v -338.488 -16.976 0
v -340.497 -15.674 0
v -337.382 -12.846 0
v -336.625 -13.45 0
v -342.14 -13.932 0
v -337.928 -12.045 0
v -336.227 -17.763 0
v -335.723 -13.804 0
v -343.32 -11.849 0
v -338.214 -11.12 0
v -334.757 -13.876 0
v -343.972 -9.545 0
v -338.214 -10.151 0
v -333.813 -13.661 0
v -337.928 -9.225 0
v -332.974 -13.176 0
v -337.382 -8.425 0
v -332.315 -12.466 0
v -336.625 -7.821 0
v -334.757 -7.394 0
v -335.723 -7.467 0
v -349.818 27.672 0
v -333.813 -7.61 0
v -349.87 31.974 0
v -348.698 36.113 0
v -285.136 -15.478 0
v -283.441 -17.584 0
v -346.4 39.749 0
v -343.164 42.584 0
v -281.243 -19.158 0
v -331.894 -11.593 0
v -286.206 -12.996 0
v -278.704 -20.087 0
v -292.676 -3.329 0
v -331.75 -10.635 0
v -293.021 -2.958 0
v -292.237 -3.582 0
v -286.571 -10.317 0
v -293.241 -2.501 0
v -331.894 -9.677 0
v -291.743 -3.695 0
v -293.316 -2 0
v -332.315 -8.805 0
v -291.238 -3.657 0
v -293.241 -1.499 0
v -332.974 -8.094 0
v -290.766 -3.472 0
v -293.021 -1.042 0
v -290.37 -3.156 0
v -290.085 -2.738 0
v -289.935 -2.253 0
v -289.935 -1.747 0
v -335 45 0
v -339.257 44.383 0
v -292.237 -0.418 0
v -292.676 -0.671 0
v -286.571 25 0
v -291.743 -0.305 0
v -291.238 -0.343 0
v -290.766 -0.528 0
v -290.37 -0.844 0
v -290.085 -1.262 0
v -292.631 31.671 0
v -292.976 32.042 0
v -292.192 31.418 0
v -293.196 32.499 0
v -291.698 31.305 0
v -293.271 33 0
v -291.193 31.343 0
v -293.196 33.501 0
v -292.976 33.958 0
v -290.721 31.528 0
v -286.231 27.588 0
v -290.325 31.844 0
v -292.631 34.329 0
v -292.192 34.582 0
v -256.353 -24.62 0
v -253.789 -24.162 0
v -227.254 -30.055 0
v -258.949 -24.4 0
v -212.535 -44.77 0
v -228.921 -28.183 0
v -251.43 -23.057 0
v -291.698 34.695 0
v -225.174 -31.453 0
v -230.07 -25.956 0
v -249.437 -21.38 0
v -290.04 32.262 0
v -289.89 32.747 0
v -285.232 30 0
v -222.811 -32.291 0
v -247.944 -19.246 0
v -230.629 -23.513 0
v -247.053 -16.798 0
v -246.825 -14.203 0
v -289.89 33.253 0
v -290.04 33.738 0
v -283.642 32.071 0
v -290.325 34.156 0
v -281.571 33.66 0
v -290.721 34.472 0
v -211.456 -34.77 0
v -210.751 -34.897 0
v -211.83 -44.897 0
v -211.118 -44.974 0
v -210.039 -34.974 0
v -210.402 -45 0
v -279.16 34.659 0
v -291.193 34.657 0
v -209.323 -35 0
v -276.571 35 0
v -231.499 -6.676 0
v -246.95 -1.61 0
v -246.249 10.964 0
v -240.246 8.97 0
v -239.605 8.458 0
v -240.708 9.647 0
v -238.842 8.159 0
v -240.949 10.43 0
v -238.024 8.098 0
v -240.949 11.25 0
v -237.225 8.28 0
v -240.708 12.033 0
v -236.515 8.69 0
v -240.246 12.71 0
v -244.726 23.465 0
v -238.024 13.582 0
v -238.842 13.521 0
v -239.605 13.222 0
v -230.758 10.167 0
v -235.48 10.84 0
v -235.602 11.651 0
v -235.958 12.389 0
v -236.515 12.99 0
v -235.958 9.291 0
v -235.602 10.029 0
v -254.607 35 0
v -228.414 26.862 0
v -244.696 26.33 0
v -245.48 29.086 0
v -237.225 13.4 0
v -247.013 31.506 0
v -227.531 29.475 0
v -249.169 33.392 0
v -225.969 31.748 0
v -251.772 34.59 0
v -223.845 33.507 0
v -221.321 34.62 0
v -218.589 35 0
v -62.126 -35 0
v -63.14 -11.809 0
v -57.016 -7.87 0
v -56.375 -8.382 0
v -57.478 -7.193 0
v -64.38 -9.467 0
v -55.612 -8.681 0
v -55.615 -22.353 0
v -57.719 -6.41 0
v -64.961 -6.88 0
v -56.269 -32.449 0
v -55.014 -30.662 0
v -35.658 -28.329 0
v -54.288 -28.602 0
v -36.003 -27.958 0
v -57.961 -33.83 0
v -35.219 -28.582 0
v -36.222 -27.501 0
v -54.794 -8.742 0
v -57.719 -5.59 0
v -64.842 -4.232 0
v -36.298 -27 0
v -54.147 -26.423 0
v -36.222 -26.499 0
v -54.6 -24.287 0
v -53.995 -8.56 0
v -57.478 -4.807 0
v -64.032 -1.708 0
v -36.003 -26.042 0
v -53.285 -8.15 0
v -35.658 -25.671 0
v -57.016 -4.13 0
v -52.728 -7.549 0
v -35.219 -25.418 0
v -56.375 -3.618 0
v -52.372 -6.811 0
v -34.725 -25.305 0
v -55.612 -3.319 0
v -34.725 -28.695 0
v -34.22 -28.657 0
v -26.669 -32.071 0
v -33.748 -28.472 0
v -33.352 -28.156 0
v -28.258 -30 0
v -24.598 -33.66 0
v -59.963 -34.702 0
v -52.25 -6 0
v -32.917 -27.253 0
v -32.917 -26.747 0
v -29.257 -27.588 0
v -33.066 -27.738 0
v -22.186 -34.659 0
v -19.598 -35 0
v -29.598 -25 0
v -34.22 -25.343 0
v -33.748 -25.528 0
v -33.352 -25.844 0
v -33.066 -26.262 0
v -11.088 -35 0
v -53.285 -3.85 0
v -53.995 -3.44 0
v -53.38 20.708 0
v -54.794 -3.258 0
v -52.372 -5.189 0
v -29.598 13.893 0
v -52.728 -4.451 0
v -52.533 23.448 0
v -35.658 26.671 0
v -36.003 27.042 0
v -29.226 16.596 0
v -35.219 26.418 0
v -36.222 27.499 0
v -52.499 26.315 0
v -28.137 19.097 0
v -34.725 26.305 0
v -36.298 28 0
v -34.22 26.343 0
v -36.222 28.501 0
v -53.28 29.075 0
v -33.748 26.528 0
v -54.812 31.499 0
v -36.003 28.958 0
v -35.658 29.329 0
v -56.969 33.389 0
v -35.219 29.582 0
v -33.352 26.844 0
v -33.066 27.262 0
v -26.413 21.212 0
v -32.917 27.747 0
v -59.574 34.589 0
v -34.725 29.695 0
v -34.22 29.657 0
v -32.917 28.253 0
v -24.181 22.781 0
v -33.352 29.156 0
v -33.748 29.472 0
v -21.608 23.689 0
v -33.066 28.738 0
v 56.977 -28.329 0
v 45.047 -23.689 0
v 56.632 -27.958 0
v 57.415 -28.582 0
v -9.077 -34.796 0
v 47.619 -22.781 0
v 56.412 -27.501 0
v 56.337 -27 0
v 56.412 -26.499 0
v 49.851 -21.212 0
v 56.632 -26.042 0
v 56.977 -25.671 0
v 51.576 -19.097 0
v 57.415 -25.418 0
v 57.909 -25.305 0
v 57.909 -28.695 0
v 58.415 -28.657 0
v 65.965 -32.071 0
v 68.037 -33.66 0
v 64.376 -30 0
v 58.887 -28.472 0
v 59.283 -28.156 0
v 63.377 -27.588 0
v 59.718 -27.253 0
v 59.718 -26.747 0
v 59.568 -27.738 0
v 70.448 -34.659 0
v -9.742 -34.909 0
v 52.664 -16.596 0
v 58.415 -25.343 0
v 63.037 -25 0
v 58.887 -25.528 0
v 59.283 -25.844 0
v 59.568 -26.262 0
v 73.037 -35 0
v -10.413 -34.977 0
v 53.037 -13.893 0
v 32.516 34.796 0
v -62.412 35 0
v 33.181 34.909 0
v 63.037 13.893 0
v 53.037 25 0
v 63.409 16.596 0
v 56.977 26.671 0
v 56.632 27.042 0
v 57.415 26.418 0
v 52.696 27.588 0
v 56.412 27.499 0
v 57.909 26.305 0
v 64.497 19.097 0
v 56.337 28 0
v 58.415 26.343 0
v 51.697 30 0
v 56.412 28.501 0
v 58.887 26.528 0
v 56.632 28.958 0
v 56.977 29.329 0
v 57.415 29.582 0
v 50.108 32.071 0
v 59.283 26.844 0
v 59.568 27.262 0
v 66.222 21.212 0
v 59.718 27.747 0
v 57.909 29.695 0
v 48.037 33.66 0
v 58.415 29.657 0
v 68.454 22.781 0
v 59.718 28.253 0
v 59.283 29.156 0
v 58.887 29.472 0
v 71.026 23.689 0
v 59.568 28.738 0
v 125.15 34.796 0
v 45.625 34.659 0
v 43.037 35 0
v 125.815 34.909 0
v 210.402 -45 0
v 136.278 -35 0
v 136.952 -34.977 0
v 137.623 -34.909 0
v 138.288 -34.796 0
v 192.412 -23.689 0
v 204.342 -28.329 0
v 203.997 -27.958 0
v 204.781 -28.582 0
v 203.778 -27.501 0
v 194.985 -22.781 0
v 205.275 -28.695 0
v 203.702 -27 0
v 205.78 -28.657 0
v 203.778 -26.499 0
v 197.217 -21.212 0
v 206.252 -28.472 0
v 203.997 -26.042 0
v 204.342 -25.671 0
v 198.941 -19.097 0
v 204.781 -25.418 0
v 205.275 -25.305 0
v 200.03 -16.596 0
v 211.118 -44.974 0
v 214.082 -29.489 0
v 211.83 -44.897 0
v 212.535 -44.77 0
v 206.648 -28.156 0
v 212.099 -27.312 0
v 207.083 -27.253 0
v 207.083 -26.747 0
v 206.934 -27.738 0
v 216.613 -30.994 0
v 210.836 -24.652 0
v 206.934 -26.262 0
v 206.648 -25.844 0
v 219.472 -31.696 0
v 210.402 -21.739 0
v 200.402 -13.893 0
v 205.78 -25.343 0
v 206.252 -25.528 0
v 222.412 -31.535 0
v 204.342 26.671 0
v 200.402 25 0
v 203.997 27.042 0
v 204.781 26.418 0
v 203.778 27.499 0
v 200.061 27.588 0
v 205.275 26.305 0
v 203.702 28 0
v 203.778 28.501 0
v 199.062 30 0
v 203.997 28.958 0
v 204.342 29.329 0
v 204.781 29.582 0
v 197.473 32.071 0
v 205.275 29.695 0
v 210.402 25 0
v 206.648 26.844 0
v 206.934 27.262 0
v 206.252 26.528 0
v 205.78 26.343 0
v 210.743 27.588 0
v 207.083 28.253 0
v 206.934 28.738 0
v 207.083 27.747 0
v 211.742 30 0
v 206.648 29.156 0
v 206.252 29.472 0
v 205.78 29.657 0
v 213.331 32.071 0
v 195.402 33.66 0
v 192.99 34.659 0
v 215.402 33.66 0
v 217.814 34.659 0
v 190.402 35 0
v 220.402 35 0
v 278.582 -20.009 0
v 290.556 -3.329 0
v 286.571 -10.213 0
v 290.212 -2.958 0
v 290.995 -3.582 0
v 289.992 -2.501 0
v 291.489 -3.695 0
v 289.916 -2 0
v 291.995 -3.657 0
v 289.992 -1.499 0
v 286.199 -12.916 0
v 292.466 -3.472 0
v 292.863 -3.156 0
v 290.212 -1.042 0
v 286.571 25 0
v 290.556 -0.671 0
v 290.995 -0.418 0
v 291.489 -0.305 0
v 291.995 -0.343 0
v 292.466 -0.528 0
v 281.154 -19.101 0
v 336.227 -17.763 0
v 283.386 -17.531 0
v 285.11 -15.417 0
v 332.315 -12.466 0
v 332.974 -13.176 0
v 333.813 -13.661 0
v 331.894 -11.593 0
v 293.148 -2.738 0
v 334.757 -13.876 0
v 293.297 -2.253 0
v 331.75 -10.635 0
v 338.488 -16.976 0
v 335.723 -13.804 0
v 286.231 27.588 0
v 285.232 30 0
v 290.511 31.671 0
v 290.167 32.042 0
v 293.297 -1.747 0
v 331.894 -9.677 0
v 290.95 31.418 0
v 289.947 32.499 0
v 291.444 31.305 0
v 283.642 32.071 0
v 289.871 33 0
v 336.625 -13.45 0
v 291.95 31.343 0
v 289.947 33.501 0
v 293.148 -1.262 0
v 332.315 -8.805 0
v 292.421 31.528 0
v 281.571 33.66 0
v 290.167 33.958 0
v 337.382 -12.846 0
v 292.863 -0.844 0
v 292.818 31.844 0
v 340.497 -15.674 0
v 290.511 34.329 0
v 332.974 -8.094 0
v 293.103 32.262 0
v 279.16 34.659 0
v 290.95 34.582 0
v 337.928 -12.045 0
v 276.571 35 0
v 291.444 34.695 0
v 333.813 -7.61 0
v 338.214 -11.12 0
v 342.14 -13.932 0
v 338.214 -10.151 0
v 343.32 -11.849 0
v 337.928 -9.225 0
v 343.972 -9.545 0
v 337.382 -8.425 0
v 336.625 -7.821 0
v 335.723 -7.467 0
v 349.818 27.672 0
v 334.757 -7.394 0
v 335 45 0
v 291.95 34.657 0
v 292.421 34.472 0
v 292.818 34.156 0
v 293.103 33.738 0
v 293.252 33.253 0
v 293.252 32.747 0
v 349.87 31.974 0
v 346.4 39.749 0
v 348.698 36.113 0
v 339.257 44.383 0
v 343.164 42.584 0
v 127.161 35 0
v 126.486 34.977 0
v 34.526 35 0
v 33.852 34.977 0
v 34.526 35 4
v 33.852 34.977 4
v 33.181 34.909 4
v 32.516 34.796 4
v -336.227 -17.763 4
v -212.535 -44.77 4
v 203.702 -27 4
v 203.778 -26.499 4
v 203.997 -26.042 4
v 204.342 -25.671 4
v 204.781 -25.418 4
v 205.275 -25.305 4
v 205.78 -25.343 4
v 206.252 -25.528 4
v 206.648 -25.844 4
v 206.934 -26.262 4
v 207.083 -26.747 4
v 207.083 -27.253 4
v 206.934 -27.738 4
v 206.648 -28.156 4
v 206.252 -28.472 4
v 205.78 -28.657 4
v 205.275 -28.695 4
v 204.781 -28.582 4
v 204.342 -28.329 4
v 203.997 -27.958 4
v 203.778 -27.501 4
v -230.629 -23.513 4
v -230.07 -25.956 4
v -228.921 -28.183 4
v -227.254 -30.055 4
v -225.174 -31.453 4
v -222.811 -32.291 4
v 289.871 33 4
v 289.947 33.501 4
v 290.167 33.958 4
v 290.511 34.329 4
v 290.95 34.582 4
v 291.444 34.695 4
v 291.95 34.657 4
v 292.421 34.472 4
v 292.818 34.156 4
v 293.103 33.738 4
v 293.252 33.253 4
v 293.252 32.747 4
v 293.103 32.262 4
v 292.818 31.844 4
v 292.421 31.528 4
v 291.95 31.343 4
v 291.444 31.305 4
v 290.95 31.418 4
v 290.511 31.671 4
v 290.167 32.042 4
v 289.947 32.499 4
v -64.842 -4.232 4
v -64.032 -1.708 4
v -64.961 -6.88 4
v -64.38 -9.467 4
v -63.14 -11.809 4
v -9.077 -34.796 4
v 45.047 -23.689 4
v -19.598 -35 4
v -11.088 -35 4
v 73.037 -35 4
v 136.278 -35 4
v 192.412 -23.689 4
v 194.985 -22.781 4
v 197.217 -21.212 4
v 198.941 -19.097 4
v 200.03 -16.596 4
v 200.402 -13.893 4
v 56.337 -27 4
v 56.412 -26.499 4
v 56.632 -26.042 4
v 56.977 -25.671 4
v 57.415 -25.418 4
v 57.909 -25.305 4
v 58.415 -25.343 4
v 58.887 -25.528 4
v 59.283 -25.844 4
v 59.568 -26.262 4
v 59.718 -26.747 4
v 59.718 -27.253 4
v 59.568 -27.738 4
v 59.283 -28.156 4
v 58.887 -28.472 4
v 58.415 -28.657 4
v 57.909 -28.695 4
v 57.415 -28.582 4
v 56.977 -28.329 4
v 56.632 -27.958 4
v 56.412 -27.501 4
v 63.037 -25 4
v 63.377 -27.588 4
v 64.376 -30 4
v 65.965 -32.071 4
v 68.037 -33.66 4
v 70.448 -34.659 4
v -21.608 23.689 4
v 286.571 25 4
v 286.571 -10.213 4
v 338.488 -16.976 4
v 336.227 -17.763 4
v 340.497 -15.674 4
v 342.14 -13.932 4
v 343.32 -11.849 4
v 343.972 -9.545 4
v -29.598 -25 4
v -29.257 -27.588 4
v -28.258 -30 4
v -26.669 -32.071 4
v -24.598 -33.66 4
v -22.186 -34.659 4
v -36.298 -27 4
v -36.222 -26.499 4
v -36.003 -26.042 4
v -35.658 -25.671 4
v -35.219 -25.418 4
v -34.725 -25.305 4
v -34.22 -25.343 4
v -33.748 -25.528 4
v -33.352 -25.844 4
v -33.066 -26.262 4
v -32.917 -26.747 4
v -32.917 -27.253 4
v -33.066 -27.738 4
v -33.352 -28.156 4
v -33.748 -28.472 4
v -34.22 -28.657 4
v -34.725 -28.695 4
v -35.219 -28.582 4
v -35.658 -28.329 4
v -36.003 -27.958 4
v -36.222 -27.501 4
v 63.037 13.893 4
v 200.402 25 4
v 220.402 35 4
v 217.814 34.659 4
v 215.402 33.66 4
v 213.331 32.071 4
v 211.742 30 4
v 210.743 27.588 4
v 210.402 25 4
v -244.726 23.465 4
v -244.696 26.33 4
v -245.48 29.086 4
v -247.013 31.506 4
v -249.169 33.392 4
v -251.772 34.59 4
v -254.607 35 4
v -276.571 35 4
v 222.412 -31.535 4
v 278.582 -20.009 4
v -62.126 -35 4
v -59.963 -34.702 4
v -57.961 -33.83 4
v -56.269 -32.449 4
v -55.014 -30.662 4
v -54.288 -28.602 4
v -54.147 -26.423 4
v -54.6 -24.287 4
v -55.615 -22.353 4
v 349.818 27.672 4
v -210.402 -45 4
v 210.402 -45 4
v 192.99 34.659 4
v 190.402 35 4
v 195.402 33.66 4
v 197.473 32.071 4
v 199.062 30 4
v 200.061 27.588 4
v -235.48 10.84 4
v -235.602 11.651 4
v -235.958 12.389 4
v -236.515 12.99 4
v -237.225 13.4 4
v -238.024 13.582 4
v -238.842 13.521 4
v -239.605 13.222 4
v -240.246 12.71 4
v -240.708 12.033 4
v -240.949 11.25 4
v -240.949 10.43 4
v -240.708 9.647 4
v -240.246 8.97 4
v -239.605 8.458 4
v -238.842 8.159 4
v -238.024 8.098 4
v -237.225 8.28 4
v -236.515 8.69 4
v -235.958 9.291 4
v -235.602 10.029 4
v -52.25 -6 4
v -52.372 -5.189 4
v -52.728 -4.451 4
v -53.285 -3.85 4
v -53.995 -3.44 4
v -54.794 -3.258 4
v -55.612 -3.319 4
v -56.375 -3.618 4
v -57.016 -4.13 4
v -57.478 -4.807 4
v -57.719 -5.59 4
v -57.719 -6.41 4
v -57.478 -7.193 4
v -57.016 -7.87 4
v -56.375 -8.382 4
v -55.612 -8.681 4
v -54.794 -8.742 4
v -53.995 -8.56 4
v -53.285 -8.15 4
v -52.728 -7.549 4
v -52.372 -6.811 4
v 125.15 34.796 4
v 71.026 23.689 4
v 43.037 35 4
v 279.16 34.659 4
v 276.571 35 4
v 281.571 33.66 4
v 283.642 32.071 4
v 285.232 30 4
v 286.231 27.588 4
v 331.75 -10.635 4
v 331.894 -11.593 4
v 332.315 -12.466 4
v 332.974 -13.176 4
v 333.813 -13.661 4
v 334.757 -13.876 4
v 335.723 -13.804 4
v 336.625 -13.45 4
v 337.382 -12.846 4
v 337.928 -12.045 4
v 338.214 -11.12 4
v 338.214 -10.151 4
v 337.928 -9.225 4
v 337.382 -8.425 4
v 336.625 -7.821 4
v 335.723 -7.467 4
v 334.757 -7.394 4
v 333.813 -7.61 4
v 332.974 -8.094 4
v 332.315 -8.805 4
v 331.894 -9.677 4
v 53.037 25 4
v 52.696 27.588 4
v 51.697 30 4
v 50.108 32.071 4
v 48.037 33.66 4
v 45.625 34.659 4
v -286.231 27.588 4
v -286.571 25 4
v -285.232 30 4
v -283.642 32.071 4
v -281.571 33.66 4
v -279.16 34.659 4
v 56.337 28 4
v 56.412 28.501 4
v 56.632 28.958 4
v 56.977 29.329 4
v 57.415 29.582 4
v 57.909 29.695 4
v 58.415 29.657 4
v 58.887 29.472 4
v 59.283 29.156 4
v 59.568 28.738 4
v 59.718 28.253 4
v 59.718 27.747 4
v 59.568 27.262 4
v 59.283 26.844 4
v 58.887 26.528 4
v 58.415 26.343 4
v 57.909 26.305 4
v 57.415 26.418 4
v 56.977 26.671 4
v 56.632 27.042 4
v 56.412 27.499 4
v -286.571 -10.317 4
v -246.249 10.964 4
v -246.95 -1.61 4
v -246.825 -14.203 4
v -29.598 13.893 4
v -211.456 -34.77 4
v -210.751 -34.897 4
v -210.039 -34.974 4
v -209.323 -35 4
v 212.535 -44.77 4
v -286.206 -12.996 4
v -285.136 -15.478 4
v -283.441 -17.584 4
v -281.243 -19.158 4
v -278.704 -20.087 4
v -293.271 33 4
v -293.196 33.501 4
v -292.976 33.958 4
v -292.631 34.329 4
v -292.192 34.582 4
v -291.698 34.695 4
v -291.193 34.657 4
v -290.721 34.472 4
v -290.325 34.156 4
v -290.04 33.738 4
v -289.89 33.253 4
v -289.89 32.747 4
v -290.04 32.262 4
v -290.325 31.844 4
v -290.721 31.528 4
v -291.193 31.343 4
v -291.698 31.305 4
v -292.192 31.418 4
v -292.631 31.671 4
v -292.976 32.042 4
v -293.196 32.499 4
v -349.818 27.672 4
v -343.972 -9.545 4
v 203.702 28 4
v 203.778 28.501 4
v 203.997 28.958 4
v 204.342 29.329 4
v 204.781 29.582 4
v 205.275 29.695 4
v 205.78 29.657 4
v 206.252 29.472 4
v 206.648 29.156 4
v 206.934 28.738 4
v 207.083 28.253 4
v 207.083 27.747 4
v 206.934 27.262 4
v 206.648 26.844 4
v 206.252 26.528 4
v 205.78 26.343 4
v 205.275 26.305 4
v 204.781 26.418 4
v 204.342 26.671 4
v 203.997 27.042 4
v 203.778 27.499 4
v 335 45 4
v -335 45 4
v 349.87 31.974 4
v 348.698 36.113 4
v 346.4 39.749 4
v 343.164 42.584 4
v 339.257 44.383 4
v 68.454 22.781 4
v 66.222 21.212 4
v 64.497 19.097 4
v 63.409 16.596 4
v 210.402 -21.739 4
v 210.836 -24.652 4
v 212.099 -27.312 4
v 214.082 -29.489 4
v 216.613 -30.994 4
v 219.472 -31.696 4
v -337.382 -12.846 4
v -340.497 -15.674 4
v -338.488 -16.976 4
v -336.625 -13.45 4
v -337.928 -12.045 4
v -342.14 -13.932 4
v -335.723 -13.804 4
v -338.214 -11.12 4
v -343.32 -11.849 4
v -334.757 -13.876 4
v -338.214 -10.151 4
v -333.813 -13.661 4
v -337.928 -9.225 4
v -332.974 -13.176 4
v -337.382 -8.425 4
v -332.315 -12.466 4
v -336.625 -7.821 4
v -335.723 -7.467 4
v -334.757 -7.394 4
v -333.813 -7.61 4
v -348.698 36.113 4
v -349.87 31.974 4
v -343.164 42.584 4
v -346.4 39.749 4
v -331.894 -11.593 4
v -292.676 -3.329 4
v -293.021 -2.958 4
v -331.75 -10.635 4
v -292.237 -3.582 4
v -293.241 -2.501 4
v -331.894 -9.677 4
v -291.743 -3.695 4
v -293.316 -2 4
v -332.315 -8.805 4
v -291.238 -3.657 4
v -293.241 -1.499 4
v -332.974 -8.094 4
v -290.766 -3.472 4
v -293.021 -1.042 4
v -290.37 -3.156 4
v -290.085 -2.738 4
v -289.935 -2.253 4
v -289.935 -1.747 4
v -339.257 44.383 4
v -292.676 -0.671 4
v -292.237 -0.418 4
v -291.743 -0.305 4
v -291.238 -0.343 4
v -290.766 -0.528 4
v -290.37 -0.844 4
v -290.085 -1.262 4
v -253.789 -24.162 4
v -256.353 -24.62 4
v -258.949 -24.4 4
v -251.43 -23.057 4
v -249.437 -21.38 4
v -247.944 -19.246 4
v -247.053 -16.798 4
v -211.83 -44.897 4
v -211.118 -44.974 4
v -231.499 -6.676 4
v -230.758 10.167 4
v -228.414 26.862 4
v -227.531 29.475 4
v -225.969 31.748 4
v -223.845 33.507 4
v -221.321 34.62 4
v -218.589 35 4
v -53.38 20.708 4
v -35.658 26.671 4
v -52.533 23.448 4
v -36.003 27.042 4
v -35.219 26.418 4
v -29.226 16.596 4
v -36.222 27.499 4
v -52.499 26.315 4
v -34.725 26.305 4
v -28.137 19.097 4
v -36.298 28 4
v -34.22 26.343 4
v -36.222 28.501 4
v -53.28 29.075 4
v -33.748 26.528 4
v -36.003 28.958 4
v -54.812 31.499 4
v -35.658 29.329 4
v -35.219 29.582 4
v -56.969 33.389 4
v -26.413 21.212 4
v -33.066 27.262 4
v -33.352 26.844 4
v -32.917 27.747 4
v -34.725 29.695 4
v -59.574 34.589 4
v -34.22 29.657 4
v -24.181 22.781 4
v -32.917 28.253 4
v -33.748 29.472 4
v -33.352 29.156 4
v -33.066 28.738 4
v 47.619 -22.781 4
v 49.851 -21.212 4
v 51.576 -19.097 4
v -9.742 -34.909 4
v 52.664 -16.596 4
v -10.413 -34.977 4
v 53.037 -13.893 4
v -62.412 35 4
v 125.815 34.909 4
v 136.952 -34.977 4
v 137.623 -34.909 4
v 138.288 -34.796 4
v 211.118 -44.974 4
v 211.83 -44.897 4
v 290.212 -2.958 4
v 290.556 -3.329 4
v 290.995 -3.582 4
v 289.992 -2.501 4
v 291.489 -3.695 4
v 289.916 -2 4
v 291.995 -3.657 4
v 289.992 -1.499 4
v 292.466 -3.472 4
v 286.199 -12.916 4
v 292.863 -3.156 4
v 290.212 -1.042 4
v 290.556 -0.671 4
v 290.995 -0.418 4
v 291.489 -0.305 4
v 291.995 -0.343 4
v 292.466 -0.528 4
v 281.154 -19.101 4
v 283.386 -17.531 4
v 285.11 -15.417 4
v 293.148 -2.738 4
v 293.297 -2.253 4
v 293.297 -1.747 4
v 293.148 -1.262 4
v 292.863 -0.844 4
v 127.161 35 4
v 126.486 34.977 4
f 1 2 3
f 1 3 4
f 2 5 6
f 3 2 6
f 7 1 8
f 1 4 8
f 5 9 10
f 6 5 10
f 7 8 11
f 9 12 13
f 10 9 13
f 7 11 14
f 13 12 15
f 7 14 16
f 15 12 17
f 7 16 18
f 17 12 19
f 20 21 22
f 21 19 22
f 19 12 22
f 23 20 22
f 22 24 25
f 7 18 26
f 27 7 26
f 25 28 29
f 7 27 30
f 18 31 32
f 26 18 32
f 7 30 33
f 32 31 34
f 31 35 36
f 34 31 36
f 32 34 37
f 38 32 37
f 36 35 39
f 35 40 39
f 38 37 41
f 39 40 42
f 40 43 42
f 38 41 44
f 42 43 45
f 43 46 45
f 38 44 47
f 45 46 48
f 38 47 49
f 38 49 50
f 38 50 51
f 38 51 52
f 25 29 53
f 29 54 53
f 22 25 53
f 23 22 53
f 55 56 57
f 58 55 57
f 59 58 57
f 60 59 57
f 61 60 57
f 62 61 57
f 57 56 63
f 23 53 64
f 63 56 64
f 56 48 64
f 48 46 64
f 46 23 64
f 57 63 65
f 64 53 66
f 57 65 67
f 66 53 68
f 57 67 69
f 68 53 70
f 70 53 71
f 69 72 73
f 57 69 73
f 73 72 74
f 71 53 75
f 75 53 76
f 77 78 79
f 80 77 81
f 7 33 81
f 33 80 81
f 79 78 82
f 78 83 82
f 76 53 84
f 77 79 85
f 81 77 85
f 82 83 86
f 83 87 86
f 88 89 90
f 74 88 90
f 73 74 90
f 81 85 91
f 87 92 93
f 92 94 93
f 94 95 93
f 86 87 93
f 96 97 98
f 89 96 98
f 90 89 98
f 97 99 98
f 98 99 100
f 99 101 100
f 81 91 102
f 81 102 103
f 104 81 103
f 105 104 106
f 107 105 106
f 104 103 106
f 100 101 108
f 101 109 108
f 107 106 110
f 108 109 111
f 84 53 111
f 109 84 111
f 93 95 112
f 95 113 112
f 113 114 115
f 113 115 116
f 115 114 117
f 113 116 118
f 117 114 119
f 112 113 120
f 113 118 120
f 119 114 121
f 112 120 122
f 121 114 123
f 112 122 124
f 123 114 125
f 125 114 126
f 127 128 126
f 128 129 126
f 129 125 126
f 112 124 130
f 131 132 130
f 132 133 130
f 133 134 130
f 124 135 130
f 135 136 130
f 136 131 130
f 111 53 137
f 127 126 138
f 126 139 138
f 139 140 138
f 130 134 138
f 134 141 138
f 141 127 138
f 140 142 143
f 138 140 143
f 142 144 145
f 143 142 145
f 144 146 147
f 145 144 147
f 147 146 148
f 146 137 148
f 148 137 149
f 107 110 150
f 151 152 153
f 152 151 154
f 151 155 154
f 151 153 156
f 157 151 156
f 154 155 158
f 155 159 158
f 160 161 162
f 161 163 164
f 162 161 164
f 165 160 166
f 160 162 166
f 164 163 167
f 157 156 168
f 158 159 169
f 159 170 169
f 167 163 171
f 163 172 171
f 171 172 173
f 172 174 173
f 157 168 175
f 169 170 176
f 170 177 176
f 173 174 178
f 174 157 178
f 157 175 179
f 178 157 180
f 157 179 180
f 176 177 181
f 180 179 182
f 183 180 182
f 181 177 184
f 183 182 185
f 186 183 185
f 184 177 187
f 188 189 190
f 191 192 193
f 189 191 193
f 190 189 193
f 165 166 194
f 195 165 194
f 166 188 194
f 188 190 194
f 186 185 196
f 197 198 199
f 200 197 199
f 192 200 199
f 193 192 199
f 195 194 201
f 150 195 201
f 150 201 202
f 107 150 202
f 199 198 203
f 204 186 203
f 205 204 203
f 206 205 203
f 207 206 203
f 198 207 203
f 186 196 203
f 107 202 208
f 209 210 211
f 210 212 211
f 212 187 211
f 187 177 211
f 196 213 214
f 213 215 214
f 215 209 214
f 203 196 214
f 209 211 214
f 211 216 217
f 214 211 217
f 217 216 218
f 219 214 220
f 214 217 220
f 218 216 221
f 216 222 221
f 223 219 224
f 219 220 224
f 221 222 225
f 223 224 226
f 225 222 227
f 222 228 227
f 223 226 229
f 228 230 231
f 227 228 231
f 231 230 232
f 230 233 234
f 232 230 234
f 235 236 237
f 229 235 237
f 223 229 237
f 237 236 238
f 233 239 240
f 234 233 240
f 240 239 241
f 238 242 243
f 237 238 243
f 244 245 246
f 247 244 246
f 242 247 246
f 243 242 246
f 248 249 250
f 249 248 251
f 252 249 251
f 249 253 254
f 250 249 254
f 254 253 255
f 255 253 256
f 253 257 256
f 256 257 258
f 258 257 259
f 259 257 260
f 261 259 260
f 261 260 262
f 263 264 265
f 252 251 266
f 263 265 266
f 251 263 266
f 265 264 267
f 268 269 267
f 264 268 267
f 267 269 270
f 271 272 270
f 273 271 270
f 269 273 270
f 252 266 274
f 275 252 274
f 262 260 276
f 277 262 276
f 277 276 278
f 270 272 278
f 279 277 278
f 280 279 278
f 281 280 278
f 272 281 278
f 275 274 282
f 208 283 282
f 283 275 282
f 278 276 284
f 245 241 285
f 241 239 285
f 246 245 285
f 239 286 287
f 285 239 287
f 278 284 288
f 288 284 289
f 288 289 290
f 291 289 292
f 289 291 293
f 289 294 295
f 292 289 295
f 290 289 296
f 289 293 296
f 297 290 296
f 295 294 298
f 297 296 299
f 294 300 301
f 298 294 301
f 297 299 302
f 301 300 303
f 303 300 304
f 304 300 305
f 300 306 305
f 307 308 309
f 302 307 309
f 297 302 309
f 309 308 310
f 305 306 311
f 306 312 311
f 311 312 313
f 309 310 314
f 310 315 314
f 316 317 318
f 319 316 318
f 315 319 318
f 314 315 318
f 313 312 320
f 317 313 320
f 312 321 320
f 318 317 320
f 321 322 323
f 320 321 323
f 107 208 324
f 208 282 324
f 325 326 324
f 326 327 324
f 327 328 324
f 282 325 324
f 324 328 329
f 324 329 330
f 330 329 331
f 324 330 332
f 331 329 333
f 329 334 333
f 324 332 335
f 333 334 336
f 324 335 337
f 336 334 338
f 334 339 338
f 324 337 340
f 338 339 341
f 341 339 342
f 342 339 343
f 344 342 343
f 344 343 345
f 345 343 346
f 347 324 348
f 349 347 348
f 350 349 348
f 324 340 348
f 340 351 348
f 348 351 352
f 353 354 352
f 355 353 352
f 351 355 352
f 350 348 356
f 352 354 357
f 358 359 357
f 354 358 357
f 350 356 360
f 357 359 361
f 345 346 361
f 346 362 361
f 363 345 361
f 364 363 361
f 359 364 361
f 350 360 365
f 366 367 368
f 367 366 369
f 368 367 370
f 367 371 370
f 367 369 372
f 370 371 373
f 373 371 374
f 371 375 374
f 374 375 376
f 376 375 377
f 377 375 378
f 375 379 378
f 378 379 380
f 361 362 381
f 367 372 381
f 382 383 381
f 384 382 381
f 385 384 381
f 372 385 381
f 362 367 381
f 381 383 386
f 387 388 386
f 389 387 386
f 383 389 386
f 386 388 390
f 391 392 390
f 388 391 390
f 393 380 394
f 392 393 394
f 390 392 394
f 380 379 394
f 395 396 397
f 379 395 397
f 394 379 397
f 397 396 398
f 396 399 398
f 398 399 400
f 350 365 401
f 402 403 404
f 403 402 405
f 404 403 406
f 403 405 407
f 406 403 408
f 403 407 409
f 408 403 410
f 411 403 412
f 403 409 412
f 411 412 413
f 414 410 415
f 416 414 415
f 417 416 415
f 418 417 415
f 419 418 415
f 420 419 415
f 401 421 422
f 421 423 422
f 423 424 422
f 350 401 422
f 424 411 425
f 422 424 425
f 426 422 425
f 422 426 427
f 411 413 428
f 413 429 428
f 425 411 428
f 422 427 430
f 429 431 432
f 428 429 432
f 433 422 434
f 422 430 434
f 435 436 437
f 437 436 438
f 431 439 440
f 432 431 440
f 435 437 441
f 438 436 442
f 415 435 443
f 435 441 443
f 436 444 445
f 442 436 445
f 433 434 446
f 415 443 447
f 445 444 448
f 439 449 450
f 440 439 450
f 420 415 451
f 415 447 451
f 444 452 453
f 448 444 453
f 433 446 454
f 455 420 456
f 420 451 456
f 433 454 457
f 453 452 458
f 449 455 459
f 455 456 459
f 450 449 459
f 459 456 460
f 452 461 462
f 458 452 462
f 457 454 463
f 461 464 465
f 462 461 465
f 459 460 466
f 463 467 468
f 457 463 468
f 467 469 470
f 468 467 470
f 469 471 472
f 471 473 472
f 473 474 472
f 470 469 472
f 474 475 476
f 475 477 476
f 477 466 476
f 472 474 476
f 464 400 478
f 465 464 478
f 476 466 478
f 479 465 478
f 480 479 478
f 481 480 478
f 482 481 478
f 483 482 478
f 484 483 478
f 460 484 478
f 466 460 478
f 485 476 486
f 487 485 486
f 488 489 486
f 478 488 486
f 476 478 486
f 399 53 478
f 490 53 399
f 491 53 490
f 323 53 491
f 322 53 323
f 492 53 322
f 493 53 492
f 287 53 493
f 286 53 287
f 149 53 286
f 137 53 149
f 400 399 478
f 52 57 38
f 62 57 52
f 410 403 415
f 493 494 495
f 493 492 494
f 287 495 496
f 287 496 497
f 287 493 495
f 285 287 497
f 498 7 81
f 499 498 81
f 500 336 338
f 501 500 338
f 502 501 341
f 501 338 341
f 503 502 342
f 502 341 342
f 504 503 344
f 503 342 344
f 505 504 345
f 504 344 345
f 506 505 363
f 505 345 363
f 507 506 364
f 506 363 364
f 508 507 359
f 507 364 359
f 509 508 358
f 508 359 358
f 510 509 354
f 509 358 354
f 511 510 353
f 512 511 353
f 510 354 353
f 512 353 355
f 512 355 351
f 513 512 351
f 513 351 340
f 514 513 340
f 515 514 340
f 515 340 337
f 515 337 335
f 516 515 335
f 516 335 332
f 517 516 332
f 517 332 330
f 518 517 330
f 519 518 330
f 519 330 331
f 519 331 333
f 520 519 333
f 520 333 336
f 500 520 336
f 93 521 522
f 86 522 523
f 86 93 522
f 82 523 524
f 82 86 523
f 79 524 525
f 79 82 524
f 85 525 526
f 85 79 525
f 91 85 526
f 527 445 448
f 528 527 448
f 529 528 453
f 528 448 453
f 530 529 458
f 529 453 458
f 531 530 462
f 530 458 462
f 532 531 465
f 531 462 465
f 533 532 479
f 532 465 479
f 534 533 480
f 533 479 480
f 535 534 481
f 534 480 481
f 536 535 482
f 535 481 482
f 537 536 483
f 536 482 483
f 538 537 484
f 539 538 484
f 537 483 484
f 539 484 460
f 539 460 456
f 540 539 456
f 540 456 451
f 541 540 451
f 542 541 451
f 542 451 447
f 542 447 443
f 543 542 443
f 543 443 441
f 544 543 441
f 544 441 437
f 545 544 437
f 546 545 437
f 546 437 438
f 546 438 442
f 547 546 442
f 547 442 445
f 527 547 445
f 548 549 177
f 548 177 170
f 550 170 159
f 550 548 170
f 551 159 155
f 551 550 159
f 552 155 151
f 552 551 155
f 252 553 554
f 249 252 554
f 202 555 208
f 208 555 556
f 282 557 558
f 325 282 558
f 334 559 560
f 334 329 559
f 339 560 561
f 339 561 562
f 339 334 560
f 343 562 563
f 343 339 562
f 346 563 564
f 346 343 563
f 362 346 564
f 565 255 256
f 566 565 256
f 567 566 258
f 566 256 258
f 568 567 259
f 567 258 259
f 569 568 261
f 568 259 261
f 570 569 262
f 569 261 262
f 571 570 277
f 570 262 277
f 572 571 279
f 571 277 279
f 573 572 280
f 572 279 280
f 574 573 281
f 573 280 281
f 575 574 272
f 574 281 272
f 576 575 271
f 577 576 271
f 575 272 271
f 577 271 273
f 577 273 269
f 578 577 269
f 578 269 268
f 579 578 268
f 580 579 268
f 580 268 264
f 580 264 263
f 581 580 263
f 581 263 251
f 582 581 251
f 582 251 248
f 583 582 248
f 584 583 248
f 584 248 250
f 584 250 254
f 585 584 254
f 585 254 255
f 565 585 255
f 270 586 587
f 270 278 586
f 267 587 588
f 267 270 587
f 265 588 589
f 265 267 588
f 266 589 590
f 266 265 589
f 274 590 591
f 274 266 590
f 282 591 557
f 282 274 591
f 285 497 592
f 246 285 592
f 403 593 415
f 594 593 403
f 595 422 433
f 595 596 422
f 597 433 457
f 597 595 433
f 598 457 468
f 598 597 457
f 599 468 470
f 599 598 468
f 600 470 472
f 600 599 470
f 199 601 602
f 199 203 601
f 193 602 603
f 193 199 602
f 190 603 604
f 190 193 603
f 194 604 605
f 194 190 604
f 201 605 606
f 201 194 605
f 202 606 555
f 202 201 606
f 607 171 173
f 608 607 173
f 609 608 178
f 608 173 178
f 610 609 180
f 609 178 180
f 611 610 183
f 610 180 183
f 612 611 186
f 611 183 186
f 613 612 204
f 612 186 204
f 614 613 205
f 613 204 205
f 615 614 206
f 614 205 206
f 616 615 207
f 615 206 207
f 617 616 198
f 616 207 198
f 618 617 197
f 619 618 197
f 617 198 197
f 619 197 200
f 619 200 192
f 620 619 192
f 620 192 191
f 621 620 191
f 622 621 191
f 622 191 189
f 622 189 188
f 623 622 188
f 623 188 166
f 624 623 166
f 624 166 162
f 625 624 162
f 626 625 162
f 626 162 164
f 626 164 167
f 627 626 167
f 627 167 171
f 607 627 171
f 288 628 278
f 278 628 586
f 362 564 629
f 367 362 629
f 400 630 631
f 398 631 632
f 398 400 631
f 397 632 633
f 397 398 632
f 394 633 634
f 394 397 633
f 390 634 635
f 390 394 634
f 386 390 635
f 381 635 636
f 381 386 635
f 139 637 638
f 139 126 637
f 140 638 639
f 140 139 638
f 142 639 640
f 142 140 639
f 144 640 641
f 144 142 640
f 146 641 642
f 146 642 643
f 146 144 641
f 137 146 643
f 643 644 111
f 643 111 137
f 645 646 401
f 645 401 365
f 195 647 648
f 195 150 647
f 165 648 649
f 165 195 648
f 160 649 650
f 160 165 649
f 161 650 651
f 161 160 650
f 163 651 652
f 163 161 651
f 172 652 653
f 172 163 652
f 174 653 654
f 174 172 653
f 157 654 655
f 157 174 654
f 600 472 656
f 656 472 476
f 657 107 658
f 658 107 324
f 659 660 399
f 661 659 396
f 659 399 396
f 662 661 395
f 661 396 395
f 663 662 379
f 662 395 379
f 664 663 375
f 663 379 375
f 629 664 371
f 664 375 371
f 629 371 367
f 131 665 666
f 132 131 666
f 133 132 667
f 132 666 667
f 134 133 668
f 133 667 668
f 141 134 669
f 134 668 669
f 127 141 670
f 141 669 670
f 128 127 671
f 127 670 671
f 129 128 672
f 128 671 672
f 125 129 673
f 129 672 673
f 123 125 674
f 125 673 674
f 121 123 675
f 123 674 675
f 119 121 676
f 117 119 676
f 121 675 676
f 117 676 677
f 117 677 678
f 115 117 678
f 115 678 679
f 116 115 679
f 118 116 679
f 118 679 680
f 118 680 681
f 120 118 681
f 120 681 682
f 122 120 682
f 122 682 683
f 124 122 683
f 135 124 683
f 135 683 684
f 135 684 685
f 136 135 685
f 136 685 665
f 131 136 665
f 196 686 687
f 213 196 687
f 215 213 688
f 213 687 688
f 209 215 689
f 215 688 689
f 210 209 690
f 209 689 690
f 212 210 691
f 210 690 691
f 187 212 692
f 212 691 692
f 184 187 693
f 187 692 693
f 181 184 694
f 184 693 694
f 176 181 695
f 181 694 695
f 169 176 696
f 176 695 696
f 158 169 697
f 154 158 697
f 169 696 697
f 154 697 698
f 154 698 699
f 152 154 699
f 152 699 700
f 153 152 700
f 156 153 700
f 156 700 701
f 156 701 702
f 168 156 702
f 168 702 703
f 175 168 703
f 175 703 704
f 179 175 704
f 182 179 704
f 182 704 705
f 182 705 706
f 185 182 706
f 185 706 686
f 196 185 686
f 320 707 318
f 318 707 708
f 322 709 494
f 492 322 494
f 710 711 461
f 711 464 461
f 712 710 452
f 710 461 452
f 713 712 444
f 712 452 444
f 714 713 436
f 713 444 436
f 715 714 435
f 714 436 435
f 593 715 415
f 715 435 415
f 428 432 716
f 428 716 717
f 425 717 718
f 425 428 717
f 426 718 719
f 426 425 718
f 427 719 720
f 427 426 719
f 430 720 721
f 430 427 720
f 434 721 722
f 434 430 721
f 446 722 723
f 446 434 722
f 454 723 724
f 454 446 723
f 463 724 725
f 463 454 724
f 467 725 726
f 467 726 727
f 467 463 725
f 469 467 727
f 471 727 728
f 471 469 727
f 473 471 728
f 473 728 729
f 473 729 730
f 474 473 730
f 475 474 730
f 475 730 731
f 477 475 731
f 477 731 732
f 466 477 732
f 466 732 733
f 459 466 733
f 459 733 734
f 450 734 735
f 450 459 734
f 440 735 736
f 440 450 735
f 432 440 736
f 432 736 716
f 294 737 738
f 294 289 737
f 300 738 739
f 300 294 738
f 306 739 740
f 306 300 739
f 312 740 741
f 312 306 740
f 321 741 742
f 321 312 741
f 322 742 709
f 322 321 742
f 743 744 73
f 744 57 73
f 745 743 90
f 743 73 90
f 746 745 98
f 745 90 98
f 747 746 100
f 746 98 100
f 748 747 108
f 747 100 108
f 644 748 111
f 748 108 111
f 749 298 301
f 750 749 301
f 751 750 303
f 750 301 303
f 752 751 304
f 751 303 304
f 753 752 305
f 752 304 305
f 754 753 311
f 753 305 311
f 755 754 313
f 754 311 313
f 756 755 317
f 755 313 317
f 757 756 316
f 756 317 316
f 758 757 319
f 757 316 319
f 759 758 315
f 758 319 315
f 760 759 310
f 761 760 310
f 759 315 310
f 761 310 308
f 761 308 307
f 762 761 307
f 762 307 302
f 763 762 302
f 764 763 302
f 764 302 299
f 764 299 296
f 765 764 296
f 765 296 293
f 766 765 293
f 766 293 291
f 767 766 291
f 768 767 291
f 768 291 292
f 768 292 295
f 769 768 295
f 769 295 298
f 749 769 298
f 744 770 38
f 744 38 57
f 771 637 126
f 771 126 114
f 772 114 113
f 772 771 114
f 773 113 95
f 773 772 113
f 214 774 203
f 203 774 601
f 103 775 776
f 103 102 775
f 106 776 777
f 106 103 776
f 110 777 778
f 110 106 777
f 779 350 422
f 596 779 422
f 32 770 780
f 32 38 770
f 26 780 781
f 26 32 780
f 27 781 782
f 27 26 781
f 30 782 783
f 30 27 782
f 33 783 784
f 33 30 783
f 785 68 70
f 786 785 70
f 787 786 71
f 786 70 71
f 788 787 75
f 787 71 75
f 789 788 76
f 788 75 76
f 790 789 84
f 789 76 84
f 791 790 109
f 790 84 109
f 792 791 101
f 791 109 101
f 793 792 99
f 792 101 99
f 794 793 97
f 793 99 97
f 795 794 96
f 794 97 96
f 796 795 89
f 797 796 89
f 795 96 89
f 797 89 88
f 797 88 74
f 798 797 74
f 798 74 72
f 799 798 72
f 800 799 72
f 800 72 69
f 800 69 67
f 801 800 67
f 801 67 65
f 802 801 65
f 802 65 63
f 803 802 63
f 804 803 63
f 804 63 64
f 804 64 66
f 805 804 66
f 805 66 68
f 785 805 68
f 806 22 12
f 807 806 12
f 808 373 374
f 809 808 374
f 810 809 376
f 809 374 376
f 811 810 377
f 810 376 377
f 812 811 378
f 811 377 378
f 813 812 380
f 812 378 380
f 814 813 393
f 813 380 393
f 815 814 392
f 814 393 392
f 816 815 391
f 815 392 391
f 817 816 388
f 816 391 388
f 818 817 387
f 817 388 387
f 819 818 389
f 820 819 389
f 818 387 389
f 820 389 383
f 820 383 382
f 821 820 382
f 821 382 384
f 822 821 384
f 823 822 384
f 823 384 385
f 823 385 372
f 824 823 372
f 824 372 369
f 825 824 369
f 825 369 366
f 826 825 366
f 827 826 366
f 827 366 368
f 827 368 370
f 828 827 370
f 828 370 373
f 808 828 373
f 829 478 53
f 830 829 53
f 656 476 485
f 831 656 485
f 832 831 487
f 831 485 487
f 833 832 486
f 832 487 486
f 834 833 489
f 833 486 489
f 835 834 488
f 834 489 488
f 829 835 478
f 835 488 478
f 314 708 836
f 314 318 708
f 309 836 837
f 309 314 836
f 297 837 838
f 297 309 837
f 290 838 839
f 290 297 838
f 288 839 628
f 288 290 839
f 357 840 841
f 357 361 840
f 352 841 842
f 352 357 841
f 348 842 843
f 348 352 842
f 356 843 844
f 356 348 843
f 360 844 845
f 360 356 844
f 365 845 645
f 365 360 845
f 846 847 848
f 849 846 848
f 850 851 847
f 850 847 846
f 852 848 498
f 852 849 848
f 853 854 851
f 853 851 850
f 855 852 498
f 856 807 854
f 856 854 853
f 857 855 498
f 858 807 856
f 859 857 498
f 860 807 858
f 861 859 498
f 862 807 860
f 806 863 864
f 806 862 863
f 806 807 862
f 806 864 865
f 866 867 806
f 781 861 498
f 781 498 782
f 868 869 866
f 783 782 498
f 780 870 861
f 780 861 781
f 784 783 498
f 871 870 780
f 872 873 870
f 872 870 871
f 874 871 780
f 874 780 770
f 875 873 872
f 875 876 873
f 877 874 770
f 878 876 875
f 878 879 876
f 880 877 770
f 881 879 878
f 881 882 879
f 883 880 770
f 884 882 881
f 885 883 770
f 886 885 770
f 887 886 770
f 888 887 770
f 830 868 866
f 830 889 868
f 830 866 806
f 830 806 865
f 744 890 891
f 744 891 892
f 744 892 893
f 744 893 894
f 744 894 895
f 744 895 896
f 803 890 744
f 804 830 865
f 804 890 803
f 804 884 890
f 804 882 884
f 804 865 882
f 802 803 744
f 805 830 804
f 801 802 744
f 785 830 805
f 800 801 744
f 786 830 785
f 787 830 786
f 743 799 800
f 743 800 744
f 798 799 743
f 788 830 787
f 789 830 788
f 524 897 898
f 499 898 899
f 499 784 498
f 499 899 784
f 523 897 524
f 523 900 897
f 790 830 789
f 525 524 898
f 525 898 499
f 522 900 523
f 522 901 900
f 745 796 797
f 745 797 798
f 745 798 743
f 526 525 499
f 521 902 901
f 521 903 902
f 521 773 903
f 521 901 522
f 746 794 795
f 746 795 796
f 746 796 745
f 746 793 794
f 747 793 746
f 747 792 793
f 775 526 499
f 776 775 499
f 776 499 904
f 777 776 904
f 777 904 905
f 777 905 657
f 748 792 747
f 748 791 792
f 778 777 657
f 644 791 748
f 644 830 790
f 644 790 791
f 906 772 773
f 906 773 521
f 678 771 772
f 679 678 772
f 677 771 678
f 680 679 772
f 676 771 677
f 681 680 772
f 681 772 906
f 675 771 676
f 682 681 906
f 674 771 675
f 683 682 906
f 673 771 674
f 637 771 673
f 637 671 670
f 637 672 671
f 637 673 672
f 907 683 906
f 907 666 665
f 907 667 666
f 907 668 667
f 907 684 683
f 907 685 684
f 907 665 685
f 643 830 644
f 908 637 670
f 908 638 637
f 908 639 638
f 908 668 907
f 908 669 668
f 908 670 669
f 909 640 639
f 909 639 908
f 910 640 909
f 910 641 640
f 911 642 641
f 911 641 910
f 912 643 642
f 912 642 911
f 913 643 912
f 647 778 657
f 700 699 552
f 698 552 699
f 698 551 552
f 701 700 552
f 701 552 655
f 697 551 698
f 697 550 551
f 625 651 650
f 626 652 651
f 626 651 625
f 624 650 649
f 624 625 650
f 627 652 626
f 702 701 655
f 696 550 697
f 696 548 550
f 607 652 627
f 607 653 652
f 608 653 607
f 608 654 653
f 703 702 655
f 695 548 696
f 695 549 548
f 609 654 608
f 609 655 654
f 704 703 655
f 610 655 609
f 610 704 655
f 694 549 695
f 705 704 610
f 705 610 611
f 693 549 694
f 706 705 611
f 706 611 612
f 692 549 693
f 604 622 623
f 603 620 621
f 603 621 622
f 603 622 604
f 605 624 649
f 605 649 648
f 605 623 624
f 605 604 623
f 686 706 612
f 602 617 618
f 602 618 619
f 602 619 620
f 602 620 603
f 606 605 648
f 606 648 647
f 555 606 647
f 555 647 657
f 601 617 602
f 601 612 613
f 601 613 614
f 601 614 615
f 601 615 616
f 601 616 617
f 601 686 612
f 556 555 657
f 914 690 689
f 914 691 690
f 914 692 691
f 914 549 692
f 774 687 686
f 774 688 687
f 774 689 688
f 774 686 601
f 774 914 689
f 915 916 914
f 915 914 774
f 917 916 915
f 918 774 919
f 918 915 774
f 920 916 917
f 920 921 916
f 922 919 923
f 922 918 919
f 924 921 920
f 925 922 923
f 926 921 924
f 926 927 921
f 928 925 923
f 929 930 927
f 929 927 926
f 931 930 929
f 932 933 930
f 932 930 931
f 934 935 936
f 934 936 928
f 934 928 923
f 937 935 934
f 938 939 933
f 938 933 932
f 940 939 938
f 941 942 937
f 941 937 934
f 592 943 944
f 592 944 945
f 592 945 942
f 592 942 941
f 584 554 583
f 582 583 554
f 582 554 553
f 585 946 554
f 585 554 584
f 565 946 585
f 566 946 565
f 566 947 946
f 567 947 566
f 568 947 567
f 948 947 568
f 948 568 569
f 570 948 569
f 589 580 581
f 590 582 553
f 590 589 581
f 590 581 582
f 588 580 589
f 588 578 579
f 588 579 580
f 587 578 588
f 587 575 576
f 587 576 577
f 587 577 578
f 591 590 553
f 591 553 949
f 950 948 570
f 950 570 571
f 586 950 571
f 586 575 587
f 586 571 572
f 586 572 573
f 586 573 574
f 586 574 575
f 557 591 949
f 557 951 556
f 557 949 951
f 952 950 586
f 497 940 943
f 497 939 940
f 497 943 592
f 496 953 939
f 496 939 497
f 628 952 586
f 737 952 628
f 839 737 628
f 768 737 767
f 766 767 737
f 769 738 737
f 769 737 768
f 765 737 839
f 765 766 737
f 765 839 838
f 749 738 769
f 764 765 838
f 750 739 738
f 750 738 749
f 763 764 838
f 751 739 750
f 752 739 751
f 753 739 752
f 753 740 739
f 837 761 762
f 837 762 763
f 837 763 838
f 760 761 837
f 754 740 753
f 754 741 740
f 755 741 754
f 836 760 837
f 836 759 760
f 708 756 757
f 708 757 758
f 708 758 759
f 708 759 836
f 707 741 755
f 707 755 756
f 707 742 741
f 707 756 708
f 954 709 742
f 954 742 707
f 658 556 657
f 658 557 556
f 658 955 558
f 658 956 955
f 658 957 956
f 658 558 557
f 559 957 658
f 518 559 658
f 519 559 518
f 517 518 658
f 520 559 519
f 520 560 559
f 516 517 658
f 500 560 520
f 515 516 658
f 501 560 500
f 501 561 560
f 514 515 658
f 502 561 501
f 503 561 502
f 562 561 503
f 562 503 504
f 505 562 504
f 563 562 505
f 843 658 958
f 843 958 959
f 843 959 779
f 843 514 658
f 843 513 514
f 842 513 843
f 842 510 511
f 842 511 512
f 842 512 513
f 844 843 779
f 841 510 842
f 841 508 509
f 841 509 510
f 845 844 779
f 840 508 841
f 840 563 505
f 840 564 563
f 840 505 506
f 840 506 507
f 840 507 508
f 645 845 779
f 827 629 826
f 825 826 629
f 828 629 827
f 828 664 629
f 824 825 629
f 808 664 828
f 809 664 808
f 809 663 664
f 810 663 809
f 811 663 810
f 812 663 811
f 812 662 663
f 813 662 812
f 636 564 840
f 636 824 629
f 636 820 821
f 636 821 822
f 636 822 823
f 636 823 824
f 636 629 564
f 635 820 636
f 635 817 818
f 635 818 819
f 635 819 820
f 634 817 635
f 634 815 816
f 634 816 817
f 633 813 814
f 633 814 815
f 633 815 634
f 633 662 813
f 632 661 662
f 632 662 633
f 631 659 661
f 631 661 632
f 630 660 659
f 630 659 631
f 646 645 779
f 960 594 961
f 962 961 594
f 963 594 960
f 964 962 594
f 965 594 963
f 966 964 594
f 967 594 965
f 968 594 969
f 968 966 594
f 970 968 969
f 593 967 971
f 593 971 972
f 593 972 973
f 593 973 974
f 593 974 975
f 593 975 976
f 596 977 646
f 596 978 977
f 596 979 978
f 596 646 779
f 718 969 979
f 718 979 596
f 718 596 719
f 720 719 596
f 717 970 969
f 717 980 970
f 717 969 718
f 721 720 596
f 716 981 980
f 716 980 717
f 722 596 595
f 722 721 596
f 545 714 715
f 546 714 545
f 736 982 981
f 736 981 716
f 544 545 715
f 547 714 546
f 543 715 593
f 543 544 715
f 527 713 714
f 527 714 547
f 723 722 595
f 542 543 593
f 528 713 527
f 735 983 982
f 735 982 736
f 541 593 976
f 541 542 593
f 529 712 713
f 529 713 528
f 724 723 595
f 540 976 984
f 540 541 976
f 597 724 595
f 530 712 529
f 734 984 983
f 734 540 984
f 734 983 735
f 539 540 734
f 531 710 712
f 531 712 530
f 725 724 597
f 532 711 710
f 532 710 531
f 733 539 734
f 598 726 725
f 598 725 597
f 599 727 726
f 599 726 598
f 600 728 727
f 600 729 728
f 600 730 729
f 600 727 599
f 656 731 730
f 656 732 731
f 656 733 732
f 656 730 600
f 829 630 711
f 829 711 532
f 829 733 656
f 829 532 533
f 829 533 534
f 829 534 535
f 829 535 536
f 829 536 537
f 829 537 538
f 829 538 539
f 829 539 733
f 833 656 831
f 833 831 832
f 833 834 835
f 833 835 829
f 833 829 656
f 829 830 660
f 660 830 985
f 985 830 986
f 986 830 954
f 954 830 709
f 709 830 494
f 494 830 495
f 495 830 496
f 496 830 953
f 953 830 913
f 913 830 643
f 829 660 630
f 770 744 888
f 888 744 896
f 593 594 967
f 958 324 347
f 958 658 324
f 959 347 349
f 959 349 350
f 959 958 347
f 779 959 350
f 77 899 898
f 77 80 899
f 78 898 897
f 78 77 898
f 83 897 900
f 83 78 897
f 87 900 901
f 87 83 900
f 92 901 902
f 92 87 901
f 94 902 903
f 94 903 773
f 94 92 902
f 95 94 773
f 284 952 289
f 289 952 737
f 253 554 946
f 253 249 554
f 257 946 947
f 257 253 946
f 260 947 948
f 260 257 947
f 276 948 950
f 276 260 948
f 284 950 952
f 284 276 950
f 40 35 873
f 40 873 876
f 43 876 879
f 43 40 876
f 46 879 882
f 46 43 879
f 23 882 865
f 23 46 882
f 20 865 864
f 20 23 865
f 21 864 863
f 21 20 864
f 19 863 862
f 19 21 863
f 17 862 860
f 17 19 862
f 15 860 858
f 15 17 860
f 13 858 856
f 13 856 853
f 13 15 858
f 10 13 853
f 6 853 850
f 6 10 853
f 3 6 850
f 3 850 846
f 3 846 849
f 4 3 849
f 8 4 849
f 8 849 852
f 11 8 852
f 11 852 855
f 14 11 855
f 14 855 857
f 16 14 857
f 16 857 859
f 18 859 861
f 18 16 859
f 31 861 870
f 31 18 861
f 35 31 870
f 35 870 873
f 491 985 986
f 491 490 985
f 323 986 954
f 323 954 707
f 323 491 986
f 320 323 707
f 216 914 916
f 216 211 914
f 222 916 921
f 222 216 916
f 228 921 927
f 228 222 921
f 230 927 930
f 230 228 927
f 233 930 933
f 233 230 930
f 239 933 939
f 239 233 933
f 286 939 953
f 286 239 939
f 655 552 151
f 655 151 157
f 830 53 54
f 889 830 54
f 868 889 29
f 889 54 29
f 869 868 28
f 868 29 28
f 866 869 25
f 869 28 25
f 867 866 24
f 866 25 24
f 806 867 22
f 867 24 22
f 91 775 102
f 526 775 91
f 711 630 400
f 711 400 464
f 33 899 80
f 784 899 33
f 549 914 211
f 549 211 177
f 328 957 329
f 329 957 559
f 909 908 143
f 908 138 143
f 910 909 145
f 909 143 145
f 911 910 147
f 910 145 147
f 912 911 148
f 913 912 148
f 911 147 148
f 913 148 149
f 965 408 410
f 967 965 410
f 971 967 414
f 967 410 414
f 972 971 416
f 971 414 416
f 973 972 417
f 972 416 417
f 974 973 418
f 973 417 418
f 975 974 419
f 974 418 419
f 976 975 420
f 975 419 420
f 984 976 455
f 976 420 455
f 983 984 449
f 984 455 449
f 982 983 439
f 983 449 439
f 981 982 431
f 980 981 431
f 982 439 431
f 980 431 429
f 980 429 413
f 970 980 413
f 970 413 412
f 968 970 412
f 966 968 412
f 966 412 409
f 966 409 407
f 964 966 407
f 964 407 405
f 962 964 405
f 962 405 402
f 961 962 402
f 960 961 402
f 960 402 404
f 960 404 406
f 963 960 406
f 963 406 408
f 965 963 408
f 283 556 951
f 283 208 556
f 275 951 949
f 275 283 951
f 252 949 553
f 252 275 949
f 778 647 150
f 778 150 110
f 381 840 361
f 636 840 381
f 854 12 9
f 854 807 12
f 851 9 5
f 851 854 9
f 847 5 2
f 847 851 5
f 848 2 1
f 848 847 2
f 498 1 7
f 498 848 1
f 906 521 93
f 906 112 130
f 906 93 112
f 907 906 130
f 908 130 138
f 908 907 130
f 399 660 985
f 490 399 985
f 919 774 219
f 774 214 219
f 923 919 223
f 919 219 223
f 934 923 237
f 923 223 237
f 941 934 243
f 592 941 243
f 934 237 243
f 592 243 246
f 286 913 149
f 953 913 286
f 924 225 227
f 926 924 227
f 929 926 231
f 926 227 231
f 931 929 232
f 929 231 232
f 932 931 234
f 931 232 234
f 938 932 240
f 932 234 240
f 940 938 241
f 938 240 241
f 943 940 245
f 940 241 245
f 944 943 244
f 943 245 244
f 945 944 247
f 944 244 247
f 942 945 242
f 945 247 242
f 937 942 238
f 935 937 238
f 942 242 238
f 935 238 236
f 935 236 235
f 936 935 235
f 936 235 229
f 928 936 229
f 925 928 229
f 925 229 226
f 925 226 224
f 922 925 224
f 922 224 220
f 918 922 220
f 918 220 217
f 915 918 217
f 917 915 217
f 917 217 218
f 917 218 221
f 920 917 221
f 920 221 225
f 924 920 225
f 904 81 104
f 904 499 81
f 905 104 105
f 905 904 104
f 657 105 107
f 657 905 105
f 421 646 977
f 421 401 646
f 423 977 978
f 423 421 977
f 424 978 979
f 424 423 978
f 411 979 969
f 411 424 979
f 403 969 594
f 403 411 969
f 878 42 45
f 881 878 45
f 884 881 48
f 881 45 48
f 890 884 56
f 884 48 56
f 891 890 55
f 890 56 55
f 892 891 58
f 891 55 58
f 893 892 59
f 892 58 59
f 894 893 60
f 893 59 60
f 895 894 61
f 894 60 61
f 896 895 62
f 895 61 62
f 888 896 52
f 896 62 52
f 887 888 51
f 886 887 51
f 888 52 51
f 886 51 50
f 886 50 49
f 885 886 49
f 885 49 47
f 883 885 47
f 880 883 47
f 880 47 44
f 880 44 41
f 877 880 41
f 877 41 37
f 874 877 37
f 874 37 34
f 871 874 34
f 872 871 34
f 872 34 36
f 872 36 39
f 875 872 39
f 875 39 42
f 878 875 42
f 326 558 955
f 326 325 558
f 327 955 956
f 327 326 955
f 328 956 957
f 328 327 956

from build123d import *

# Parameters (mm, degrees)
SKETCH_1_R          = 3.25
EXTRUDE_1_DEPTH     = 4
HOLE_WIZARD_M52_D   = 5.5
CUT_EXTRUDE_3_DEPTH = 353.903669576
FILLET_2_R          = 10
FILLET_3_R          = 10
HOLE_WIZARD_M31_D   = 3.4
FILLET_4_R          = 8


with BuildPart() as part:
    # Эскиз1 → Бобышка-Вытянуть1 (new body)
    with BuildSketch(Plane.XY):
        with BuildLine():
            Line((-349.818316726, 27.672449915), (-342.910885265, -16.303620822))
            Line((-342.910885265, -16.303620822), (-211.481081006, -45))
            Line((-211.481081006, -45), (211.481081006, -45))
            Line((211.481081006, -45), (342.910885265, -16.303620822))
            Line((342.910885265, -16.303620822), (349.818316726, 27.672449915))
            ThreePointArc((349.818316726, 27.672449915), (346.399852001, 39.749019149), (335, 45))
            Line((335, 45), (-335, 45))
            ThreePointArc((-335, 45), (-346.399852001, 39.749019149), (-349.818316726, 27.672449915))
        make_face()
        with Locations((-335, -10.635315981)):
            Circle(SKETCH_1_R, mode=Mode.SUBTRACT)
        with Locations(Location((335, -10.635315981, 0), (0, 0, 180))):
            Circle(SKETCH_1_R, mode=Mode.SUBTRACT)
    extrude(amount=EXTRUDE_1_DEPTH)

    # Отверстие с зазором M52 (through all)
    with Locations(Plane(origin=(0, 0, 0), x_dir=(-1, 0, 0), z_dir=(0, 0, -1))):
        with Locations((55, -6), (238.23, 10.84)):
            Hole(HOLE_WIZARD_M52_D / 2)

    # Эскиз10 → Вырез-Вытянуть3 (cut, through all)
    with BuildSketch(Plane.XY.offset(4)):
        with BuildLine():
            Line((-286.571319769, 35), (-242.571319769, 35))
            ThreePointArc((-242.571319769, 35), (-246.739453064, 3.999106889), (-245.818518827, -27.267178292))
            Line((-245.818518827, -27.267178292), (-286.571319769, -18.369213063))
            Line((-286.571319769, -18.369213063), (-286.571319769, 35))
        make_face()
        with BuildLine():
            Line((-226.671925486, 35), (-46.587816989, 35))
            Line((-46.587816989, 35), (-64.032014151, -1.707830342))
            ThreePointArc((-64.032014151, -1.707830342), (-64.961194769, -6.880112935), (-63.13950341, -11.809344562))
            Line((-63.13950341, -11.809344562), (-46.587816989, -35))
            Line((-46.587816989, -35), (-210.402090952, -35))
            Line((-210.402090952, -35), (-229.752534006, -30.775024894))
            ThreePointArc((-229.752534006, -30.775024894), (-231.306735573, 2.257420391), (-226.671925486, 35))
        make_face()
        Polygon((286.571319769, 35), (286.571319769, -18.369213063), (210.402090952, -34), (210.402090952, 35), align=None)
        Polygon((200.402090952, 35), (126.145146633, 35), (63.036502818, 22.049392771), (63.036502818, -35), (137.293447136, -35), (200.402090952, -22.049392771), align=None)
        Polygon((-29.597909048, 22.049392771), (-29.597909048, -35), (-10.072140997, -35), (53.036502818, -22.049392771), (53.036502818, 35), (33.510734767, 35), align=None)
    extrude(amount=-CUT_EXTRUDE_3_DEPTH, mode=Mode.SUBTRACT)

    # Скругление2
    fillet_2_edges = [part.edges().sort_by_distance(p)[0] for p in [
        (342.910885265, -16.303620822, 2),
        (211.481081006, -45, 2),
        (-211.481081006, -45, 2),
        (-342.910885265, -16.303620822, 2),
        (-286.571319769, -18.369213063, 2),
        (-286.571319769, 35, 2),
        (-242.571319769, 35, 2),
        (-245.818518827, -27.267178292, 2),
        (210.402090952, 35, 2),
        (286.571319769, 35, 2),
        (286.571319769, -18.369213063, 2),
        (210.402090952, -34, 2),
        (-210.402090952, -35, 2),
        (-229.752534006, -30.775024894, 2),
        (-226.671925486, 35, 2),
        (-46.587816989, 35, 2),
    ]]
    fillet(fillet_2_edges, radius=FILLET_2_R)

    # Скругление3
    fillet_3_edges = [part.edges().sort_by_distance(p)[0] for p in [
        (33.510734767, 35, 2),
        (53.036502818, 35, 2),
        (53.036502818, -22.049392771, 2),
        (-10.072140997, -35, 2),
        (-29.597909048, -35, 2),
        (-29.597909048, 22.049392771, 2),
        (63.036502818, 22.049392771, 2),
        (126.145146633, 35, 2),
        (200.402090952, 35, 2),
        (200.402090952, -22.049392771, 2),
        (137.293447136, -35, 2),
        (63.036502818, -35, 2),
    ]]
    fillet(fillet_3_edges, radius=FILLET_3_R)

    # Отверстие с зазором M31 (through all)
    with Locations(Plane.XY.offset(4)):
        with Locations((-34.597909048, 28), (-34.597909048, -27), (205.402090952, -27), (205.402090952, 28), (291.571319769, 33), (291.6163356, -2), (-291.6163356, -2), (-291.571319769, 33), (58.036502818, 28), (58.036502818, -27)):
            Hole(HOLE_WIZARD_M31_D / 2)

    # Скругление4
    fillet_4_edges = [part.edges().sort_by_distance(p)[0] for p in [
        (-46.587816989, -35, 2),
    ]]
    fillet(fillet_4_edges, radius=FILLET_4_R)


solid = part.part
